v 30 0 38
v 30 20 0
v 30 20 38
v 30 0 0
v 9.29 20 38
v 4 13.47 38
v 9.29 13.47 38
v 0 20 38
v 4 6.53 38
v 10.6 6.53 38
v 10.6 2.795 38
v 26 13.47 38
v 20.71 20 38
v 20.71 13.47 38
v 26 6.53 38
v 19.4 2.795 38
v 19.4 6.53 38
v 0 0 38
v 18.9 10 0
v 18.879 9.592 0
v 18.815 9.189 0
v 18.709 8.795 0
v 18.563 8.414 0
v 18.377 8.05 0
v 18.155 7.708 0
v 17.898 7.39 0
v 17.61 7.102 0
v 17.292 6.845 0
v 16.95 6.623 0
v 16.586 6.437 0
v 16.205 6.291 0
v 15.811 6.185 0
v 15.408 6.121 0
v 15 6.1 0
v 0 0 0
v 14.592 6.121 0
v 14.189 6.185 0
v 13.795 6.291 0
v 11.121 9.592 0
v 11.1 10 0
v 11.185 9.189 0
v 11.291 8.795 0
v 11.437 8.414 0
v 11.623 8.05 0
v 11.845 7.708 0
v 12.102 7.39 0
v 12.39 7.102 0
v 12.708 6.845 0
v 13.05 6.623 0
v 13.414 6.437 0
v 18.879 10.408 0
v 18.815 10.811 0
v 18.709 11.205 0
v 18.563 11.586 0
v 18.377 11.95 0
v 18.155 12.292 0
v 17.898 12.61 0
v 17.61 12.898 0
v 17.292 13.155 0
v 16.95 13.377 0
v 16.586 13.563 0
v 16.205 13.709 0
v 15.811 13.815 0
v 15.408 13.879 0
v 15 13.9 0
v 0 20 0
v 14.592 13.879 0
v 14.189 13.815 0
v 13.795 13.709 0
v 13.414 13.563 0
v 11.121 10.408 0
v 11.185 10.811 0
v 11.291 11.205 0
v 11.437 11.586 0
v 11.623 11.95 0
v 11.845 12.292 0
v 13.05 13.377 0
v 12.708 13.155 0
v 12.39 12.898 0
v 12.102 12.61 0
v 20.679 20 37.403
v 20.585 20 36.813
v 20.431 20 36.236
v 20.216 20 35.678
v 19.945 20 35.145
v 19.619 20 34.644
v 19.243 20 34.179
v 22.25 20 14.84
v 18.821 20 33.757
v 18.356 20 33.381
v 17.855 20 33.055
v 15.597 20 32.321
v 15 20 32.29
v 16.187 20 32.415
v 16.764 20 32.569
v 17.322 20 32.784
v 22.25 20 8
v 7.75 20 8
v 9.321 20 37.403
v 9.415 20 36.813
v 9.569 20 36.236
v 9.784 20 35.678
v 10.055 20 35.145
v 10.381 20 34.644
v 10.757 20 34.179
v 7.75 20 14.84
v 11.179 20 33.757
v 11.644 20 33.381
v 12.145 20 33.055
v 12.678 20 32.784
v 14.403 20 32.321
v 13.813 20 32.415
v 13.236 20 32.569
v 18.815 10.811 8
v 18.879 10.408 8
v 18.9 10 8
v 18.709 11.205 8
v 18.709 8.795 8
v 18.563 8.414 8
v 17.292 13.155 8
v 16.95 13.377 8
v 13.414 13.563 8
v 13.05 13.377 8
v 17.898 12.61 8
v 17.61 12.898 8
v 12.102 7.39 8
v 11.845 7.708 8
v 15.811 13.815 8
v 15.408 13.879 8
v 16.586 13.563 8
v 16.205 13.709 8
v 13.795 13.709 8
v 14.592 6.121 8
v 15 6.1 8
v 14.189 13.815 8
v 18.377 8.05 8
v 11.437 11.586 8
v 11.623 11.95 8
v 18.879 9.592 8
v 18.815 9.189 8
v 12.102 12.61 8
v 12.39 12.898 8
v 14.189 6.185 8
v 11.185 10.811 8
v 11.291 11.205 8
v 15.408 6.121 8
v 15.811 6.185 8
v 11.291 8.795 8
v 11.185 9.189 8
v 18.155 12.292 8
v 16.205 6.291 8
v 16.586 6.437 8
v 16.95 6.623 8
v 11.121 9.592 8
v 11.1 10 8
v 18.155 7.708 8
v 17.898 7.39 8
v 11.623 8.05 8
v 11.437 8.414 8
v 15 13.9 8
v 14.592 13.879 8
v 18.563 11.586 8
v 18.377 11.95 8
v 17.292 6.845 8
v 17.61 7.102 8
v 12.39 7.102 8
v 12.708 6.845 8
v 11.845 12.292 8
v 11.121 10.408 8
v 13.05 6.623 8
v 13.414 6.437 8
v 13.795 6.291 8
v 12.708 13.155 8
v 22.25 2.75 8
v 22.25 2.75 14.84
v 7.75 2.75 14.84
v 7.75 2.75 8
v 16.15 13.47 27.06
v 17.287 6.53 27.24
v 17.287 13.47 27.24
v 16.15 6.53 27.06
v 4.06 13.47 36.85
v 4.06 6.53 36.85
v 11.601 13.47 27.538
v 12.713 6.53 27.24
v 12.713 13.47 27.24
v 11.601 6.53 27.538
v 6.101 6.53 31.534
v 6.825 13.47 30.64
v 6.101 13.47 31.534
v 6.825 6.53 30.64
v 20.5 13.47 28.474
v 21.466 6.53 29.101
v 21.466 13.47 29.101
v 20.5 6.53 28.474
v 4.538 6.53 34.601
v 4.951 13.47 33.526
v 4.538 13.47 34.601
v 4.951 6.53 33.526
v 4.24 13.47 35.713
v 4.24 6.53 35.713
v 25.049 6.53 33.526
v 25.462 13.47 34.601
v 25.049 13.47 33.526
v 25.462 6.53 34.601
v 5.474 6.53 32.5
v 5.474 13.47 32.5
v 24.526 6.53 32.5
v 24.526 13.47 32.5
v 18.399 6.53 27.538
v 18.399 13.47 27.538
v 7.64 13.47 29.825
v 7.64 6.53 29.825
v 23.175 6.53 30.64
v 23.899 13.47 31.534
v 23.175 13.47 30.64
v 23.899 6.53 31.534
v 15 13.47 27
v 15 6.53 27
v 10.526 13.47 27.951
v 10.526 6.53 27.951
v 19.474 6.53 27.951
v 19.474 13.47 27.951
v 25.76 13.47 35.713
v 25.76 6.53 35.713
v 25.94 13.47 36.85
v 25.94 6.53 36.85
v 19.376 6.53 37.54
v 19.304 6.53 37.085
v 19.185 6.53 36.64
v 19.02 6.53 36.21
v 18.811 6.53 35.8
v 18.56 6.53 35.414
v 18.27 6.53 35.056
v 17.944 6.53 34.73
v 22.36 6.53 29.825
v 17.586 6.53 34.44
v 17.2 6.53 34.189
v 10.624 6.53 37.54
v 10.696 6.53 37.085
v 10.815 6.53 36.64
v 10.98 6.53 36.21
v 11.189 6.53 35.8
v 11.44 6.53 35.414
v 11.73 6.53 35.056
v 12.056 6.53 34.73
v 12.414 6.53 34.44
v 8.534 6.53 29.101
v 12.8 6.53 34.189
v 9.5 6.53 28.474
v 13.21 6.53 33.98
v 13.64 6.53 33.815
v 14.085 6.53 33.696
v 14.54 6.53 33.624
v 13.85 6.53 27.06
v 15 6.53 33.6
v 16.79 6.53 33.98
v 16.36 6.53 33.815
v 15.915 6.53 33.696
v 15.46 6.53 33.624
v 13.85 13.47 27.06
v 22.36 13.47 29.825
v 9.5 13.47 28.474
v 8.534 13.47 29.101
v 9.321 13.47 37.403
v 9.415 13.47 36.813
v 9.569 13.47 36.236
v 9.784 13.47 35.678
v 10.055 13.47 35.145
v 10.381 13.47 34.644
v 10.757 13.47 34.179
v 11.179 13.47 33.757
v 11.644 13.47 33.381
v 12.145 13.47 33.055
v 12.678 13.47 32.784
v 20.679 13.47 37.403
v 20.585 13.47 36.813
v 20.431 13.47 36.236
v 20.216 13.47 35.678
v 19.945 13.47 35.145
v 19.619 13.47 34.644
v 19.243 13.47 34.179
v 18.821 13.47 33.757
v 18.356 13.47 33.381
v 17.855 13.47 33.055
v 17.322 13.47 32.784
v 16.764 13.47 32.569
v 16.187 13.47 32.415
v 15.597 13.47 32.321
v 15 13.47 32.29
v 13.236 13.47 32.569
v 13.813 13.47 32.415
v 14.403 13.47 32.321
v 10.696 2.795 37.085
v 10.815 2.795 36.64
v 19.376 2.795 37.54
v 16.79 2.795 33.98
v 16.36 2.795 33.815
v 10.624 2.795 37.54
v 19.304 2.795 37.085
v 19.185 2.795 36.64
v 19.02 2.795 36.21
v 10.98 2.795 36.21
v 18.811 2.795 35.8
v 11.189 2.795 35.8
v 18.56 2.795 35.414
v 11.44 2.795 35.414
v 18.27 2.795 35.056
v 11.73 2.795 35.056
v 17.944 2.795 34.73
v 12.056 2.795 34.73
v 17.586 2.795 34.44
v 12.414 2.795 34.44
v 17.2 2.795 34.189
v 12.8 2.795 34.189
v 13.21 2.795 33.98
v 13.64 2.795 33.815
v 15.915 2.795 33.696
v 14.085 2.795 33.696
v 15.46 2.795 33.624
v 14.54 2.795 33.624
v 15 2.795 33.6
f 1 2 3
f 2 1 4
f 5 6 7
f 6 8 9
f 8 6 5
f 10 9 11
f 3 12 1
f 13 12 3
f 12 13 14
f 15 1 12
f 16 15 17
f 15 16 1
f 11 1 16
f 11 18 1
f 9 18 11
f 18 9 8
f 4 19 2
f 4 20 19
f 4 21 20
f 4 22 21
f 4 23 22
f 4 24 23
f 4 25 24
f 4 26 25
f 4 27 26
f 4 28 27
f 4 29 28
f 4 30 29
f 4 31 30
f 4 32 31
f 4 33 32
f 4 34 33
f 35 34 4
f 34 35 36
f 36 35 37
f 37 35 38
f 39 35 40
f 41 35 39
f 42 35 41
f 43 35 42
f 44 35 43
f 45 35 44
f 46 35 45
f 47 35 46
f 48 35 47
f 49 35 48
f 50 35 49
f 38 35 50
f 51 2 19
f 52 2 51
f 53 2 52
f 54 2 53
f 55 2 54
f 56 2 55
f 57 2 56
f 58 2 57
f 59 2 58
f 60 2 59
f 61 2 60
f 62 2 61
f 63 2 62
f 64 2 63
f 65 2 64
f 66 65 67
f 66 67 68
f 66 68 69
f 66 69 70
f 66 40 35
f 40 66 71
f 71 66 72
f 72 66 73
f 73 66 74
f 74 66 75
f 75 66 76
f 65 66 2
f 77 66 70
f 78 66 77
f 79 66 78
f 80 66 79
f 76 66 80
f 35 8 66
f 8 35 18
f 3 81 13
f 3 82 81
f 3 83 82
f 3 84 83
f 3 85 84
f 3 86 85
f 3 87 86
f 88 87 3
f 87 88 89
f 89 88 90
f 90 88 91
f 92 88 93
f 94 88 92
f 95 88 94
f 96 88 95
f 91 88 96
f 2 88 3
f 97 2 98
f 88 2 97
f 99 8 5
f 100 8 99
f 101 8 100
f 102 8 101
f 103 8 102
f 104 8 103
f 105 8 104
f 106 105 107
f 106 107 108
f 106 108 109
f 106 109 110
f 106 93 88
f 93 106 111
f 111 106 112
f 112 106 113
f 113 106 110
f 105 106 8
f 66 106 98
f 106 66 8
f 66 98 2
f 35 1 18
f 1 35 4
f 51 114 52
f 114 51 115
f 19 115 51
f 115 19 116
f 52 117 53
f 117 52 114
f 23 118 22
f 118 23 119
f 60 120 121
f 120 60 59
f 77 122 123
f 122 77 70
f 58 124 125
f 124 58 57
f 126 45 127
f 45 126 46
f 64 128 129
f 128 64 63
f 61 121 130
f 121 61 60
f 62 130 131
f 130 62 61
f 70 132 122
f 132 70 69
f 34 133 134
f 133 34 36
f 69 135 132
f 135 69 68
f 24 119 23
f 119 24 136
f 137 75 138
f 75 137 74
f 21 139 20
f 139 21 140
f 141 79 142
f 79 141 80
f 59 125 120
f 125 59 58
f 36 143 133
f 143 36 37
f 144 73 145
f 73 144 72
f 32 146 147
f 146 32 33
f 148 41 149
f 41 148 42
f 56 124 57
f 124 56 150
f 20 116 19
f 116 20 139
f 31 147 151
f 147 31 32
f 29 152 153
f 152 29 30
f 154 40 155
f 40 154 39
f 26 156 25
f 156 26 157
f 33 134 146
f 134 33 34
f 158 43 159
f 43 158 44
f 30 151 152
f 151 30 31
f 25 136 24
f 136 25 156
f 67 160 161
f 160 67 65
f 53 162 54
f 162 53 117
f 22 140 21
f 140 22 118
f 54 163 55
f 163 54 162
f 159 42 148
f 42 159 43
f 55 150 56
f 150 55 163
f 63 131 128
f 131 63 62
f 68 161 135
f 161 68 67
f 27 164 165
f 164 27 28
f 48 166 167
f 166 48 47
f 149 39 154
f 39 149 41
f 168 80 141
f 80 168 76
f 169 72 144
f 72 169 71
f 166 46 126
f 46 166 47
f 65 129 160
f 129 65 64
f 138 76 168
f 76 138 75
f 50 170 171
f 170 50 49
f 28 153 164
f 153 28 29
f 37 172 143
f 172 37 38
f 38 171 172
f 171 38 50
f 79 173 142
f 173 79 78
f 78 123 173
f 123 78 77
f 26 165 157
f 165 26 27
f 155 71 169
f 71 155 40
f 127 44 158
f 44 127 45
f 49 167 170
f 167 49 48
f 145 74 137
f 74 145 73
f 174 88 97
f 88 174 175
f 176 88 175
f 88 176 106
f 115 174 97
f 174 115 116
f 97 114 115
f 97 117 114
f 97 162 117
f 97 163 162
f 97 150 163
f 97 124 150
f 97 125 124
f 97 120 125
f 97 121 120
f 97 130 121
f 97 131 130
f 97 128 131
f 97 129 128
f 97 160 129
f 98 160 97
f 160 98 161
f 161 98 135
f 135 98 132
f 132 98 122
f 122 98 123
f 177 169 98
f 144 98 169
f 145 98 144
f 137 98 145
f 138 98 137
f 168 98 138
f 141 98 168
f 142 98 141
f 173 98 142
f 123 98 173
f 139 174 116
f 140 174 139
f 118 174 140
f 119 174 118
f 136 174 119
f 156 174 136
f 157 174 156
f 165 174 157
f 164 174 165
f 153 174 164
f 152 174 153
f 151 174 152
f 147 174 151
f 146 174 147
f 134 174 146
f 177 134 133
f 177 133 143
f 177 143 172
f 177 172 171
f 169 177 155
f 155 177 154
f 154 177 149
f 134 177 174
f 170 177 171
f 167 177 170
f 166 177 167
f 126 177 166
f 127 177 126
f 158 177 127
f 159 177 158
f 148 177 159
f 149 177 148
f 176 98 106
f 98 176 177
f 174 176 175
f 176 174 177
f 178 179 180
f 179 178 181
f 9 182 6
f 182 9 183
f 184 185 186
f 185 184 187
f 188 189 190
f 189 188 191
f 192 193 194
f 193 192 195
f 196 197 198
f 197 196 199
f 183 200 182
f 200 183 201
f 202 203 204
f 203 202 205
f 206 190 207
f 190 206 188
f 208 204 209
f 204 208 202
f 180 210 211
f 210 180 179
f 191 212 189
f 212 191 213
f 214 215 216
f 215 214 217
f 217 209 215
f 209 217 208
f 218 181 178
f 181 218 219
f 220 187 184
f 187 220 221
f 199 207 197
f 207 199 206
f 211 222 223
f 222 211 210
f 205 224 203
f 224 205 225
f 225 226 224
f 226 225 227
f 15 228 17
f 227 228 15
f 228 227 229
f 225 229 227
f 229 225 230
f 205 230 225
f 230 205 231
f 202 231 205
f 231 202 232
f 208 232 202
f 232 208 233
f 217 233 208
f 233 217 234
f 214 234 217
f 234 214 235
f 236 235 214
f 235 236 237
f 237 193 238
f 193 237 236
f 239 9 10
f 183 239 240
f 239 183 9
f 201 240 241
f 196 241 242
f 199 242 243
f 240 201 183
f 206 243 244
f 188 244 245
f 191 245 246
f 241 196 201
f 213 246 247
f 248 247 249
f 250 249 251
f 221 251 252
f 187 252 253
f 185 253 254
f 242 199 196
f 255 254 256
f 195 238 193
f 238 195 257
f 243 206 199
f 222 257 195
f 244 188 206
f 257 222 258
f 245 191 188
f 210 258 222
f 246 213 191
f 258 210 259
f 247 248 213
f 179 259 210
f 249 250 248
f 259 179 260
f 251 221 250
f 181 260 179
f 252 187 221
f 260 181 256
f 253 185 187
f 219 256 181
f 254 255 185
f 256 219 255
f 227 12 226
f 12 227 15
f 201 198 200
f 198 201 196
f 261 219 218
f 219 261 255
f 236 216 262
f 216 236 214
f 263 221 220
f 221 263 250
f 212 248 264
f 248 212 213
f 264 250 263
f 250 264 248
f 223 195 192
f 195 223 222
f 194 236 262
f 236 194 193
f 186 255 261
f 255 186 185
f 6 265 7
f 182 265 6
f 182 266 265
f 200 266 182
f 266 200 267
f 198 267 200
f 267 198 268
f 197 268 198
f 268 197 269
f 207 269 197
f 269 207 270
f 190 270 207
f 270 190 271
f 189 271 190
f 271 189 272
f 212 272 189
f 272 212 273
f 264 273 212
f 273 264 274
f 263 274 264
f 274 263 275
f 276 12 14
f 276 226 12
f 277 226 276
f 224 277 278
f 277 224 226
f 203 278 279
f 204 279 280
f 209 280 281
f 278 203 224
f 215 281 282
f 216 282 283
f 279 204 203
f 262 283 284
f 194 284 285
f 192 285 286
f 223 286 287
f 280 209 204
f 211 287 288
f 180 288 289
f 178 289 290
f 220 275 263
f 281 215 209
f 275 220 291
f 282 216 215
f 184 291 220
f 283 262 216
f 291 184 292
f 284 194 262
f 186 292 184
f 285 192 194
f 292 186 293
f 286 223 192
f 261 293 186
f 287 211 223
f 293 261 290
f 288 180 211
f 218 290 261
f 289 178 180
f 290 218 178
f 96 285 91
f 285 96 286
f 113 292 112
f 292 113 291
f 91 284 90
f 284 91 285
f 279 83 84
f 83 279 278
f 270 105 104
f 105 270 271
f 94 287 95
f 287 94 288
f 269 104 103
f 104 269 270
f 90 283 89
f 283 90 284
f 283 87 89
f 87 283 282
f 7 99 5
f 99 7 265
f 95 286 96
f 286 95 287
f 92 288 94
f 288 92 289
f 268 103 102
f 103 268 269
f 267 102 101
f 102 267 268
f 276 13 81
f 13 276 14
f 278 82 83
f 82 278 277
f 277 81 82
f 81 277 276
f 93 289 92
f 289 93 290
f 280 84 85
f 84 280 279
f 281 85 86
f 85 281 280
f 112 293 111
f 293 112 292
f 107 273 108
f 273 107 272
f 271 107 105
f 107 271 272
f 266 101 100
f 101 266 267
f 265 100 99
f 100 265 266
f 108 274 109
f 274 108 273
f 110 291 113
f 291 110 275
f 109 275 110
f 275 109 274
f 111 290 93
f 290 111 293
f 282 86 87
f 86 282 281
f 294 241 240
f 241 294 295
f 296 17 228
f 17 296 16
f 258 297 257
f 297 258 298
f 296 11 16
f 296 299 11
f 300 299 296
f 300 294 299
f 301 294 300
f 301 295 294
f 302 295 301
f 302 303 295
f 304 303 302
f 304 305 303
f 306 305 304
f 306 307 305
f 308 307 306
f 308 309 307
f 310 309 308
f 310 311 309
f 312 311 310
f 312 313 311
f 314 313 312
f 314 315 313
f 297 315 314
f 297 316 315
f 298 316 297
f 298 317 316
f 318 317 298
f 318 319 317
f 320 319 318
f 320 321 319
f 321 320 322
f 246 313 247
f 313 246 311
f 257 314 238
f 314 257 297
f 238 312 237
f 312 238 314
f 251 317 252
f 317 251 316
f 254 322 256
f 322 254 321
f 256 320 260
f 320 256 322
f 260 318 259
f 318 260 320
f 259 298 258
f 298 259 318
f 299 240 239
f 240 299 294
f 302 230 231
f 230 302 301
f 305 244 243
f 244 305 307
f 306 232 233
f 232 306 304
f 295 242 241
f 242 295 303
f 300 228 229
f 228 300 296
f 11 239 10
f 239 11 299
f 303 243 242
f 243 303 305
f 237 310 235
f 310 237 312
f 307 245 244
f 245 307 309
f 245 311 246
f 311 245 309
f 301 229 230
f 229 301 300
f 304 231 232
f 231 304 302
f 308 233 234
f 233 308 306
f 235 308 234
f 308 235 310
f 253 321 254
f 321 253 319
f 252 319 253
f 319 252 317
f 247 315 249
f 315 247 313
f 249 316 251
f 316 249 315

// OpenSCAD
// file: ../inc/frame_mount_connector.scad
module frame_mount_connector_hole(w, l) {
    cylinder(r=2, h=20); 
}

module frame_mount_connector_edge(w, l) {
    difference() {
        rotate([45, 0, 0]) rotate([0, 90, 0])
            difference() {
                cube([w, w, l]);
                rotate([0, 0, 45])
                    cube([w*2, w*2, l]);
            }
         translate([0, w/4.5, -w-3]) rotate([90, 0, 90])
            cube([w, w, l+1]);
    }

}


//frame_mount_connector_edge(10, 30);
// file: ../frame_mount_holder.scad
include <inc/common.scad>
use <inc/frame_mount_connector.scad>


plate_holder_thickness = 11;



module plate_holder(mount_height, has_nut_hole) {
        difference() {
            cube([30, plate_holder_thickness, mount_height]);
            translate([0, (plate_holder_thickness-frame_thickness)/2, 0])
                cube([30, frame_thickness, mount_height-10]);
            if (has_nut_hole)
                translate([8, 0, 5])
                    horizontal_m3_hole();
            if (has_nut_hole)
                translate([22, 0, 5])
                    horizontal_m3_hole();
 
        }
}

//rotate([180, 0, 0])
difference() {
    union() {
        plate_holder(60, true);
        translate([0, -1.7, 70])
            frame_mount_connector_edge(10, 30);
    }
    // xy slot
    translate([30/2, (plate_holder_thickness)/2, 64])
        frame_mount_connector_hole();
}
// file: ../inc/common.scad
m8_r = 3.9;
m8_nut_outer_d = 14.5;
m8_nut_h = 6.34;

module m8_rod(l) {
    rotate([-90, 0, 0])
        cylinder(r=m8_r, h=l);
}

bearing_608zz_h = 6.94;
bearing_608zz_d = 22;
bearing_608zz_r = bearing_608zz_d/2;

frame_thickness = 3.14;

module m3_hole(l) {
    m3_r = 1.475;
    cylinder(r=m3_r, h=l);
}

module horizontal_m3_hole() {
    translate([0, 60, 0])
        rotate([90, 0, 0])
            m3_hole(70);
}
// main file
include <../inc/common.scad>
use <../frame_mount_holder.scad>

$fn = 60;
holder_thickness = 20.;


bearing_h = bearing_608zz_h;
bearing_r = bearing_608zz_d/2;
module m8_bearing() {
    rotate([90, 0, 0]) cylinder(r=bearing_r, h=bearing_h);
}

module m8_bearing_holder(mount_height) {
        difference() {
            cube([30, holder_thickness, mount_height]);
            translate([15, holder_thickness/2, 0])
                cylinder(r=m8_r, h=11);
            translate([(30-m8_nut_outer_d)/2,
                      (holder_thickness-m8_nut_outer_d)/2, 8]) 
                cube([m8_nut_outer_d, m8_nut_outer_d+10, m8_nut_h+0.5]);
            // bearing and rod slot
            translate([15, (holder_thickness+bearing_h)/2, mount_height])
                m8_bearing();
            translate([15, (holder_thickness+bearing_h)-bearing_h, mount_height])
                rotate([90, 0, 0]) cylinder(r=5.71, h=bearing_h+0.5);
            translate([15, 8, mount_height])
                rotate([90, 0, 0]) cylinder(r=m8_r+0.5, h=bearing_h*3/4); 
        }     
        %translate([15, 5, mount_height]) m8_rod(50);
}

m8_bearing_holder(38, true);
